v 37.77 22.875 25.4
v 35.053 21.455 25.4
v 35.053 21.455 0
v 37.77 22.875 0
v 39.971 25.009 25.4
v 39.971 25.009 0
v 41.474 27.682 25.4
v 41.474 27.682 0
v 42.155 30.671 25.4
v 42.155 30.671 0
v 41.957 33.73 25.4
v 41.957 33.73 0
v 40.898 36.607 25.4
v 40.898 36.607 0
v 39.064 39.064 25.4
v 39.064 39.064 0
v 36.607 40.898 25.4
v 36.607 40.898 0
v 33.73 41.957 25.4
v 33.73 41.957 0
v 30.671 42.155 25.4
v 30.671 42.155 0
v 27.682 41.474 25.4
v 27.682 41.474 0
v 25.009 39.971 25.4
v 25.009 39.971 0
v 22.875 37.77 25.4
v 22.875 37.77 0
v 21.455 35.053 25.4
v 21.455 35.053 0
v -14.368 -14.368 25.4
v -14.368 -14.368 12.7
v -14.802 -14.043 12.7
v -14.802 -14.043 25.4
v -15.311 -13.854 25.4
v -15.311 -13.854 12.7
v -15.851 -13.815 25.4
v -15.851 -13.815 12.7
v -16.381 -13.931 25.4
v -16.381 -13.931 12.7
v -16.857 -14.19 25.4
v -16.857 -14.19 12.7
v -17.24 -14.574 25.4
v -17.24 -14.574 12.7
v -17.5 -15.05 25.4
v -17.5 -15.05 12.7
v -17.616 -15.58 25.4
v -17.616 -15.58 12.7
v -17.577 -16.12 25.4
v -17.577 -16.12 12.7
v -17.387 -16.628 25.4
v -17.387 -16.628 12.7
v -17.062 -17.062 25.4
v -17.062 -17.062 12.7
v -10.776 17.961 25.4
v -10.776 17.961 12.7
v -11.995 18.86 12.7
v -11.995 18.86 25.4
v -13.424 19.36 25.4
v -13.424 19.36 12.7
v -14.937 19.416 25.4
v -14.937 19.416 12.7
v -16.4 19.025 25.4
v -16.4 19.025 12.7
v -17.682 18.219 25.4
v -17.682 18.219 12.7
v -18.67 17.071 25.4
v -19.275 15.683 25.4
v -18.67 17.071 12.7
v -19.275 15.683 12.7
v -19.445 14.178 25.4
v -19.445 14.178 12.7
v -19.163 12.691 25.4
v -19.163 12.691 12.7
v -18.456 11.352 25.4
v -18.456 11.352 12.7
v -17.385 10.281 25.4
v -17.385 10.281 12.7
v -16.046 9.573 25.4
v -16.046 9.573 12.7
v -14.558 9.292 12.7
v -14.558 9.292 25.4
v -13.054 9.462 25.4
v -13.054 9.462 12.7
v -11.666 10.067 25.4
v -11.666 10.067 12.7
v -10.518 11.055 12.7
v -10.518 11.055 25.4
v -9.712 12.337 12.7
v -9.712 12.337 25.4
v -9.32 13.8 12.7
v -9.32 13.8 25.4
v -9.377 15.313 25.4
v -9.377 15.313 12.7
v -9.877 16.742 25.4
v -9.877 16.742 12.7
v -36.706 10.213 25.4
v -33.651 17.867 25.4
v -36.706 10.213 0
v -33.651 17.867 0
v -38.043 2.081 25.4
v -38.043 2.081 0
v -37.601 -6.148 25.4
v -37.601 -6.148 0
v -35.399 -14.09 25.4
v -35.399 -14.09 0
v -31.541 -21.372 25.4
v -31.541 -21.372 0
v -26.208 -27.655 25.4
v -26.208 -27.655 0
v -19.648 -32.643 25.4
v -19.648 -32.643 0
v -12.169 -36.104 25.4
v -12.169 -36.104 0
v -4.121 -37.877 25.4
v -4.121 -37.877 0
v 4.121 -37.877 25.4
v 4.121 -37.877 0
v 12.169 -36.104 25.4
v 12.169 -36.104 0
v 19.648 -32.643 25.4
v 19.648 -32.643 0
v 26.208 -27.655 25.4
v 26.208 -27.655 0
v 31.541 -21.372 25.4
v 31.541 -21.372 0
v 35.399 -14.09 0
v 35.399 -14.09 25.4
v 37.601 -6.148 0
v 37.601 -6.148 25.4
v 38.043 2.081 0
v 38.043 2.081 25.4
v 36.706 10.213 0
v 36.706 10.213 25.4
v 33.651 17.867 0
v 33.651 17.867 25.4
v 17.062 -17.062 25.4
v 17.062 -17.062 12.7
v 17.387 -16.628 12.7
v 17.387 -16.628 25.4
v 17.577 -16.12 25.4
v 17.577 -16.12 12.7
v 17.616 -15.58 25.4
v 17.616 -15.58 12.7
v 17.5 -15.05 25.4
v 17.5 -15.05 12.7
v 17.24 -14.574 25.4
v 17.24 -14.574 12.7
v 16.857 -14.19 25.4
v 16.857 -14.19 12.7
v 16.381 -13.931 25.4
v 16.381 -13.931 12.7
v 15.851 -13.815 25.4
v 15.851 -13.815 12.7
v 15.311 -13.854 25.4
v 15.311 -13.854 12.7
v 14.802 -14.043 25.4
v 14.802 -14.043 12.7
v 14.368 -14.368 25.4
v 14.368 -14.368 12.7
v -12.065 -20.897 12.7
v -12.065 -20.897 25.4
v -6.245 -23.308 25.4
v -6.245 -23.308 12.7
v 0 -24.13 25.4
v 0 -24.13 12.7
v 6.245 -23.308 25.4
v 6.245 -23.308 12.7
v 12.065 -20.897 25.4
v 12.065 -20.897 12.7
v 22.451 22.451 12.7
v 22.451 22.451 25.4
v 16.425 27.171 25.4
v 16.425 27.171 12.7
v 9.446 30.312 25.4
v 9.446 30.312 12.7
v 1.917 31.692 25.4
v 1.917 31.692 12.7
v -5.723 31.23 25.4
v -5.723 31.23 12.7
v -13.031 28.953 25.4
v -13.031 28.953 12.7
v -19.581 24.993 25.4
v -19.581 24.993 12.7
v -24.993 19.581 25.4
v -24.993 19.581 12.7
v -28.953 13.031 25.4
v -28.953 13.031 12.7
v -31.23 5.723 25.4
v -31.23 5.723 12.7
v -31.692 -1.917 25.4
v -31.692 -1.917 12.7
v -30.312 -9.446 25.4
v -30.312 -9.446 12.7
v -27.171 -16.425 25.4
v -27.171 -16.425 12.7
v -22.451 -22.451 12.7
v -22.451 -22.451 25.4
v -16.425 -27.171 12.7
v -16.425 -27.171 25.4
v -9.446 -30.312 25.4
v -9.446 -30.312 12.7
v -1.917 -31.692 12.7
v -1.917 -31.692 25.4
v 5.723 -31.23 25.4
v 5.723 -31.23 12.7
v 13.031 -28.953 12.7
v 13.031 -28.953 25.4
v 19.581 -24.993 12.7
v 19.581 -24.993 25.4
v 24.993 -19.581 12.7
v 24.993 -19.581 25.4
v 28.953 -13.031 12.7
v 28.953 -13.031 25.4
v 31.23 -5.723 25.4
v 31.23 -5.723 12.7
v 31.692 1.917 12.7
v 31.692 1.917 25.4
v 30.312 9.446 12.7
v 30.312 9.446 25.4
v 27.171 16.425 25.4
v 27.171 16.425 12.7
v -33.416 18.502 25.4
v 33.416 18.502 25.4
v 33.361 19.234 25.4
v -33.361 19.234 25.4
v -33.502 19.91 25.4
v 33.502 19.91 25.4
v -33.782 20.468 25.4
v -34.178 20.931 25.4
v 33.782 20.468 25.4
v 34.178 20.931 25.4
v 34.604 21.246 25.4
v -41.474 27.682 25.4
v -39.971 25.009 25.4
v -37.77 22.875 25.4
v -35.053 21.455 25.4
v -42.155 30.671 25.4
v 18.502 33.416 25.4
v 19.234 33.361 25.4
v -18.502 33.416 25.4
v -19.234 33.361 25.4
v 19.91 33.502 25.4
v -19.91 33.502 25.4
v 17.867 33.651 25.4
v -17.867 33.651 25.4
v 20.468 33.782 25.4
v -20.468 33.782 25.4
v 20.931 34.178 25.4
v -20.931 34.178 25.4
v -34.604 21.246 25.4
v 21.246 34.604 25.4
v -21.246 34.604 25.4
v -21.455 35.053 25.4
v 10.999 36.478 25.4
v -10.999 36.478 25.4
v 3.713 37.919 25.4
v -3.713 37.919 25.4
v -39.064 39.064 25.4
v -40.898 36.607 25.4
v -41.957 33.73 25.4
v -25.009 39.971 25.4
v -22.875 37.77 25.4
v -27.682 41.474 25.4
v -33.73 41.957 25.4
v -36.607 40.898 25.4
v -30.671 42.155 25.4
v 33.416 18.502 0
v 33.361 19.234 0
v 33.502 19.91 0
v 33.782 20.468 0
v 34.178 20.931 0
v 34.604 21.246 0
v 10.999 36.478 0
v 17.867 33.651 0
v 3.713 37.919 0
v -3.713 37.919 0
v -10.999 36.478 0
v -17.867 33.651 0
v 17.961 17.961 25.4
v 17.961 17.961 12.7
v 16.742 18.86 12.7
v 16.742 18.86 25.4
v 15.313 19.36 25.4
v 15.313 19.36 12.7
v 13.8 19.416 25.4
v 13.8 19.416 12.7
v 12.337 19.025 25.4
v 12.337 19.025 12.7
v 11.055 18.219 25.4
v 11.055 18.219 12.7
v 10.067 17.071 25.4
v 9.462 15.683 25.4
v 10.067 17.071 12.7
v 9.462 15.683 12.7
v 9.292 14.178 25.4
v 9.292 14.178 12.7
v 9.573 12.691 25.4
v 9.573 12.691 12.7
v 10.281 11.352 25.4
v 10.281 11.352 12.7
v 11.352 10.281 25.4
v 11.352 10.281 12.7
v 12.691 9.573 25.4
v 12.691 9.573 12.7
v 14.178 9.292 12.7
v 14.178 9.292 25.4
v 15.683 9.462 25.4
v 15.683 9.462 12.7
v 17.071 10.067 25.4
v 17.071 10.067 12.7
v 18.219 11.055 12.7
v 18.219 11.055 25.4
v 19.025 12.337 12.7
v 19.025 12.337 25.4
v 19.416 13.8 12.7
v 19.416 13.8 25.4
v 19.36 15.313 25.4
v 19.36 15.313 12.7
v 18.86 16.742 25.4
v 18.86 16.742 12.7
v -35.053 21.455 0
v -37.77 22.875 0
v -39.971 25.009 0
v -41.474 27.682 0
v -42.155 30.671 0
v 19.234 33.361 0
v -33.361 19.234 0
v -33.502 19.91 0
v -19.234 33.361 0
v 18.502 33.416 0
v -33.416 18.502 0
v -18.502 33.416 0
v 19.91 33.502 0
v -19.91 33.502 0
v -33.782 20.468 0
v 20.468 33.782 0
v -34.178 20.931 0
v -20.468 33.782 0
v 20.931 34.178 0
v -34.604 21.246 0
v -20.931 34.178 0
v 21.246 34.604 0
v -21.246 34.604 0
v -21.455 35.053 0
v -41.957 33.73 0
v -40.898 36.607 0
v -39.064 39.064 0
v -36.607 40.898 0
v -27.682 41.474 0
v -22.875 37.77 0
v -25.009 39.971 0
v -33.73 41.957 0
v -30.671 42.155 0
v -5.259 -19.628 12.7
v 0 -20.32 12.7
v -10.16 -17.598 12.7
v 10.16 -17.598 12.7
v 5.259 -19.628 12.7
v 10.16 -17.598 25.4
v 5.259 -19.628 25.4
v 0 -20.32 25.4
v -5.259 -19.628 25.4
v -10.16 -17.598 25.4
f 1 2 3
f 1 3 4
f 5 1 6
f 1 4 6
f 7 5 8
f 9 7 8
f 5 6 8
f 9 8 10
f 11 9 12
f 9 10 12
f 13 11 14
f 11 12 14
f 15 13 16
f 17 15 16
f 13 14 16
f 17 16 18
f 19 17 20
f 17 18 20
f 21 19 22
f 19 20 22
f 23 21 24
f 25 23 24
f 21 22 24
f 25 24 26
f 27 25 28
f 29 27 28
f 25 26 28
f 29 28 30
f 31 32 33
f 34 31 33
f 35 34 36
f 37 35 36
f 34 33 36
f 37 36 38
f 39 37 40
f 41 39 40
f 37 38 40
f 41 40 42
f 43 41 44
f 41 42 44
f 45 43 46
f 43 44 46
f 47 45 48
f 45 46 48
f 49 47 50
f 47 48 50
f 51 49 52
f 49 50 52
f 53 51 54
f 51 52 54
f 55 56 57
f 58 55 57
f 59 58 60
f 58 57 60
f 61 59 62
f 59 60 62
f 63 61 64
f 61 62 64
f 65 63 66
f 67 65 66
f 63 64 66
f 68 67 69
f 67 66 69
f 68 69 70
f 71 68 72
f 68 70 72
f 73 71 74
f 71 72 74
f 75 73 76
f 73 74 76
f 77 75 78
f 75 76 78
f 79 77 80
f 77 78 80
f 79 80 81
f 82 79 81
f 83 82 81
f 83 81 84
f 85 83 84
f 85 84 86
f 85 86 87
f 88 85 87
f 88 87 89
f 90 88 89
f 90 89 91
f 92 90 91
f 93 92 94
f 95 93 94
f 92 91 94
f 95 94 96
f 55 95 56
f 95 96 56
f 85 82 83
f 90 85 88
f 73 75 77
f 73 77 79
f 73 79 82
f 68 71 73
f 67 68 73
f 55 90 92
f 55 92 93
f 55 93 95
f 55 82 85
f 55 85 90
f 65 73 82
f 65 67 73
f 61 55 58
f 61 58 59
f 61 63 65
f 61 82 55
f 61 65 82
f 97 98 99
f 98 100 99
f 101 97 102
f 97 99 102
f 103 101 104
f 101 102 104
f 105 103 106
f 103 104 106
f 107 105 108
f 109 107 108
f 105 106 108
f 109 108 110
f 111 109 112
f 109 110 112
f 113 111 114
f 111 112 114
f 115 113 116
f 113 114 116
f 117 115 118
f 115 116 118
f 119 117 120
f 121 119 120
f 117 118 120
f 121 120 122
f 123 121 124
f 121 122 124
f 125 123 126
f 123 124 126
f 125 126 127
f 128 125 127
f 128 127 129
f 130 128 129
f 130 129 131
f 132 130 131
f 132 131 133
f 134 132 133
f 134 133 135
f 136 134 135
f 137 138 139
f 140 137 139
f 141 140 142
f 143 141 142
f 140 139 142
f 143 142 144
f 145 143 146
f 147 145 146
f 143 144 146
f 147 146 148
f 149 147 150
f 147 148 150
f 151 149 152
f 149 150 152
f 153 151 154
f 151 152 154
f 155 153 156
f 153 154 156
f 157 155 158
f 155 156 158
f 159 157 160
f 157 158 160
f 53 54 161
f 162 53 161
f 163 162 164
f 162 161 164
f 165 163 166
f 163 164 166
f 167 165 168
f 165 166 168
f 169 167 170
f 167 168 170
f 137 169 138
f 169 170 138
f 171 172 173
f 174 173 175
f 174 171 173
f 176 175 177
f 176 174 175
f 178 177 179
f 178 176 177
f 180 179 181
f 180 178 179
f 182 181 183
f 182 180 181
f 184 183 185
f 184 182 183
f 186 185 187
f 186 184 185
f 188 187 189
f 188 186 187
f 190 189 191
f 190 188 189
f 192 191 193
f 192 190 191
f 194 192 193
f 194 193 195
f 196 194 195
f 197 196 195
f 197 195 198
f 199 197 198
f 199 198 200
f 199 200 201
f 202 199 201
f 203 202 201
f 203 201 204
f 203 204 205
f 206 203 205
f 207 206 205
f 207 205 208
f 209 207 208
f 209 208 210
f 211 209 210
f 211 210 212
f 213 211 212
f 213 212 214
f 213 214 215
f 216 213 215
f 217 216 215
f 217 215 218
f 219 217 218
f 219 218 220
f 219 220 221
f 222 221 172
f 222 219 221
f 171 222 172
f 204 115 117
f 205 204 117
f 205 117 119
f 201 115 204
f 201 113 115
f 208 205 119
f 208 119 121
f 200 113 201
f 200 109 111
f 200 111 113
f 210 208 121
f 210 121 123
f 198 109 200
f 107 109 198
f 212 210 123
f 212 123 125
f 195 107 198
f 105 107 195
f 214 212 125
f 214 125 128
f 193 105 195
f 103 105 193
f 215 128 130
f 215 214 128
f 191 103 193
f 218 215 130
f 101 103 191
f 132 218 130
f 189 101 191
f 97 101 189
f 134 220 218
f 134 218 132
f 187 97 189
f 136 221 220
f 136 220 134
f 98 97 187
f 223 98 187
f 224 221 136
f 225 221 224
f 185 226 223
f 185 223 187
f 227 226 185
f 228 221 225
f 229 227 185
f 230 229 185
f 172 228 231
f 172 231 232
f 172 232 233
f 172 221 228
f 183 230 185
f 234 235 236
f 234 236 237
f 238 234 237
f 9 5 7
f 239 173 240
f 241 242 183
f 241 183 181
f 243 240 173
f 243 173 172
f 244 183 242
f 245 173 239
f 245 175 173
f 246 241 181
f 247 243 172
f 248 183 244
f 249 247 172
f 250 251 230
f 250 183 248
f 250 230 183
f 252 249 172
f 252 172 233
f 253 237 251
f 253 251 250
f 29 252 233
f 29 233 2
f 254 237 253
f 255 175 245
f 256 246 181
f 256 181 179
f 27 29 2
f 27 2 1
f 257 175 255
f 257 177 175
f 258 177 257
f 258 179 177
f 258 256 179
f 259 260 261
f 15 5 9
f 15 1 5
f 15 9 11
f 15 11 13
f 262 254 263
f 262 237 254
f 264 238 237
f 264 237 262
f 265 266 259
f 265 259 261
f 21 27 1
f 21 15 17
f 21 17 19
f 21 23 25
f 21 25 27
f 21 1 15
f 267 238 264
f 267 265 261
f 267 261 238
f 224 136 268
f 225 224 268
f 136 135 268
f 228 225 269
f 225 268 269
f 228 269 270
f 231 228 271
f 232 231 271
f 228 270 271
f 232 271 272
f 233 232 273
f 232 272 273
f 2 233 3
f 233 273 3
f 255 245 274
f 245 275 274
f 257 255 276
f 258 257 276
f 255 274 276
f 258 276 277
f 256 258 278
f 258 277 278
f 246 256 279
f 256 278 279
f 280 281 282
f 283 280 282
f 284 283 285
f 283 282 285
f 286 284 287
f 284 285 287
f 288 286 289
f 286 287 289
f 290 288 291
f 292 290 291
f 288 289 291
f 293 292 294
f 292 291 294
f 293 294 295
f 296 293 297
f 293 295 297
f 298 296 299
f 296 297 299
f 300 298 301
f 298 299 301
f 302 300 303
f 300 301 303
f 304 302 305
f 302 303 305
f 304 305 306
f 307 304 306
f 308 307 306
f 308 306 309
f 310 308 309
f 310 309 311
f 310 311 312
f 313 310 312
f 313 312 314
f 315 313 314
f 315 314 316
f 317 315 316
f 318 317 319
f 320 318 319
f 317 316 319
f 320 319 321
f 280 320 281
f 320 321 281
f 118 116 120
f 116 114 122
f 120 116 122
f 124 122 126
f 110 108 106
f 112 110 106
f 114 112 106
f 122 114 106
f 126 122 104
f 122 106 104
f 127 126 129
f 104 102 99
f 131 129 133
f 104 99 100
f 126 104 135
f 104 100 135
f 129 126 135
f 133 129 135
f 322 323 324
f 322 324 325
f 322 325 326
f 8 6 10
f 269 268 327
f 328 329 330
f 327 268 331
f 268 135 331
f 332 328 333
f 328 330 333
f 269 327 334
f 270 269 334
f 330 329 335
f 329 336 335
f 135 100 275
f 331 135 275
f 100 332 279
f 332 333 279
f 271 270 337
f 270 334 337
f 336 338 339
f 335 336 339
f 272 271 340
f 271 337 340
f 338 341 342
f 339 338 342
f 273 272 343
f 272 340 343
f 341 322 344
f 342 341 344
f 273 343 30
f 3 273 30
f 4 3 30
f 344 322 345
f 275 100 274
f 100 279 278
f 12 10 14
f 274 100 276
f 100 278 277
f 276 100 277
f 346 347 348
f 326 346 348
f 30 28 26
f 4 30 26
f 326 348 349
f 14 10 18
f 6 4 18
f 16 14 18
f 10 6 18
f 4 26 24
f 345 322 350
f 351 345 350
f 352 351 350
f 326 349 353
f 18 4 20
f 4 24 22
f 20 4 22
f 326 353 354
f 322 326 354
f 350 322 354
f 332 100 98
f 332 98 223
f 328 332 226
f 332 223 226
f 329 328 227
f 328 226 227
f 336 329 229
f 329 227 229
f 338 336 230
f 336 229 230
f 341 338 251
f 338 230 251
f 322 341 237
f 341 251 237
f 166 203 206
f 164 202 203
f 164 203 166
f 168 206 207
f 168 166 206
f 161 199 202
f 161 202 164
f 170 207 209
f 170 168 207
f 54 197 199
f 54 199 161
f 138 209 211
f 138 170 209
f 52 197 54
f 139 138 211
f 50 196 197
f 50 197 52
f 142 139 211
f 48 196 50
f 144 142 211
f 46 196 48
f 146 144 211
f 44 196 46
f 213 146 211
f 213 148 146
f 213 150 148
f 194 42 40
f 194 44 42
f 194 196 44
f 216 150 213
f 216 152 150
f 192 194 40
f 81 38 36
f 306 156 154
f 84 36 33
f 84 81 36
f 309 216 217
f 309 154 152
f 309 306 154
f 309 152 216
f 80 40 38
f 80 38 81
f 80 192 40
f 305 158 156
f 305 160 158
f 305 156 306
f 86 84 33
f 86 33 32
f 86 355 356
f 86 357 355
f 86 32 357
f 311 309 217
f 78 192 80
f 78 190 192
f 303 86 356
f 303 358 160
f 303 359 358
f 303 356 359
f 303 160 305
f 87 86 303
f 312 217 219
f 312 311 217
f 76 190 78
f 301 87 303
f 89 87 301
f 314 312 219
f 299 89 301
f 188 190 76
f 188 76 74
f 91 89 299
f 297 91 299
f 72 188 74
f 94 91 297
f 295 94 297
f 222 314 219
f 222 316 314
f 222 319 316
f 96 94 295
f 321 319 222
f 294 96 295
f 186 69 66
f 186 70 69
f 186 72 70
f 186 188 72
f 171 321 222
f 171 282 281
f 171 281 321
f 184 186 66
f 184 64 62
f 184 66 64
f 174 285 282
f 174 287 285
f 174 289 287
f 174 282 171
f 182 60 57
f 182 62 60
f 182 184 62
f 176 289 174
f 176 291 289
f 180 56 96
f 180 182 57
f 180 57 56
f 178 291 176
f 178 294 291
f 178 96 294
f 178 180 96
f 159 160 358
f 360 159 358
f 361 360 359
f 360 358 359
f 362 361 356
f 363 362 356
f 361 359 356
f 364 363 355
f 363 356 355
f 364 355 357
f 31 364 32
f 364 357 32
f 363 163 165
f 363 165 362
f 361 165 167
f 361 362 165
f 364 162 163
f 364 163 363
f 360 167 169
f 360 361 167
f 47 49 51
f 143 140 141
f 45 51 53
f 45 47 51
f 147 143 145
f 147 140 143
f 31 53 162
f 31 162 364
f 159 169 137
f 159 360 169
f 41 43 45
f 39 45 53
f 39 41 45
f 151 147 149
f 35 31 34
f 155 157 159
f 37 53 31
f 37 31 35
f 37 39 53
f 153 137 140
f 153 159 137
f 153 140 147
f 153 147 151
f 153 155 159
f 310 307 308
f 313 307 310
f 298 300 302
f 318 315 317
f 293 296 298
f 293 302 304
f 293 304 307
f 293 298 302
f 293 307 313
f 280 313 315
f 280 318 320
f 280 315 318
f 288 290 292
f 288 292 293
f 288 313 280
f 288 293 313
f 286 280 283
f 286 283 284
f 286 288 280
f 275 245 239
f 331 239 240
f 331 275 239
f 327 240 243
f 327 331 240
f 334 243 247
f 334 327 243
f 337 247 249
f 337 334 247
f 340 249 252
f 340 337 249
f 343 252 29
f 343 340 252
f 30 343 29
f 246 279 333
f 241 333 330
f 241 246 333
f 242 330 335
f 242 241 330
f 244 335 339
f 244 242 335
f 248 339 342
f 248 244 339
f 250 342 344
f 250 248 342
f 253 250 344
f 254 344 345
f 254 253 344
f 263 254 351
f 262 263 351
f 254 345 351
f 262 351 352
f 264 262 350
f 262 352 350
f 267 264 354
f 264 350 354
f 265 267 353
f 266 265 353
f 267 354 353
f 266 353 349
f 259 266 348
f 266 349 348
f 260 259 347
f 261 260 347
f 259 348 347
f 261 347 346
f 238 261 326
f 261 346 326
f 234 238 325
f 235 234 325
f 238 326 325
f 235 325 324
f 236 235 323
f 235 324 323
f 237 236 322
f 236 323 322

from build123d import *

# Parameters (mm, degrees)
F0_R     = 31.75
F2_DEPTH = 12.7
F3_R     = 5.08
F4_DEPTH = 12.7
F5_DEPTH = 25.4
F6_ANGLE = 45
F7_R     = 2.54


with BuildPart() as f2:
    # F0 (on Top) → F2 (new body)
    with BuildSketch(Plane.XY):
        with BuildLine():
            ThreePointArc((37.2940384615, -7.7951712765), (37.8979739919, -3.9183628351), (38.1, 0))
            ThreePointArc((38.1, 0), (37.8979739919, 3.9183628351), (37.2940384615, 7.7951712765))
            ThreePointArc((37.2940384615, 7.7951712765), (26.9407683632, 26.9407683632), (7.7951712765, 37.2940384615))
            ThreePointArc((7.7951712765, 37.2940384615), (0, 38.1), (-7.7951712765, 37.2940384615))
            ThreePointArc((-7.7951712765, 37.2940384615), (-26.9407683632, -26.9407683632), (37.2940384615, -7.7951712765))
        make_face()
        Circle(F0_R, mode=Mode.SUBTRACT)
        with BuildLine():
            ThreePointArc((37.2940384615, 7.7951712765), (37.8979739919, 3.9183628351), (38.1, 0))
            ThreePointArc((38.1, 0), (37.8979739919, -3.9183628351), (37.2940384615, -7.7951712765))
            ThreePointArc((37.2940384615, -7.7951712765), (55.245, 0), (37.2940384615, 7.7951712765))
        make_face()
        with BuildLine():
            ThreePointArc((-7.7951712765, 37.2940384615), (0, 38.1), (7.7951712765, 37.2940384615))
            ThreePointArc((7.7951712765, 37.2940384615), (0, 55.245), (-7.7951712765, 37.2940384615))
        make_face()
        Circle(F0_R)
    extrude(amount=F2_DEPTH)

    # F3 (on face) → F4 (join)
    with BuildSketch(Plane.XY.offset(12.7)):
        with Locations((0, 20.32)):
            Circle(F3_R)
        with Locations((20.32, 0)):
            Circle(F3_R)
        with BuildLine():
            ThreePointArc((0, -24.13), (1.905, -22.225), (0, -20.32))
            ThreePointArc((0, -20.32), (-14.3684097937, -14.3684097937), (-20.32, 0))
            ThreePointArc((-20.32, 0), (-22.225, 1.905), (-24.13, 0))
            ThreePointArc((-24.13, 0), (-17.06248663, -17.06248663), (0, -24.13))
        make_face()
    extrude(amount=F4_DEPTH)

    # F0 (on Top) → F5 (join)
    with BuildSketch(Plane.XY):
        with BuildLine():
            ThreePointArc((37.2940384615, -7.7951712765), (37.8979739919, -3.9183628351), (38.1, 0))
            ThreePointArc((38.1, 0), (37.8979739919, 3.9183628351), (37.2940384615, 7.7951712765))
            ThreePointArc((37.2940384615, 7.7951712765), (26.9407683632, 26.9407683632), (7.7951712765, 37.2940384615))
            ThreePointArc((7.7951712765, 37.2940384615), (0, 38.1), (-7.7951712765, 37.2940384615))
            ThreePointArc((-7.7951712765, 37.2940384615), (-26.9407683632, -26.9407683632), (37.2940384615, -7.7951712765))
        make_face()
        Circle(F0_R, mode=Mode.SUBTRACT)
        with BuildLine():
            ThreePointArc((-7.7951712765, 37.2940384615), (0, 38.1), (7.7951712765, 37.2940384615))
            ThreePointArc((7.7951712765, 37.2940384615), (0, 55.245), (-7.7951712765, 37.2940384615))
        make_face()
        with BuildLine():
            ThreePointArc((37.2940384615, 7.7951712765), (37.8979739919, 3.9183628351), (38.1, 0))
            ThreePointArc((38.1, 0), (37.8979739919, -3.9183628351), (37.2940384615, -7.7951712765))
            ThreePointArc((37.2940384615, -7.7951712765), (55.245, 0), (37.2940384615, 7.7951712765))
        make_face()
    extrude(amount=F5_DEPTH)


with BuildPart() as f2_1:
    # F6: moved
    add(f2.part.rotate(Axis((0, 0, 29.6926), (0, 0, 1)), F6_ANGLE))

    # F7
    f7_edges = [f2_1.edges().sort_by_distance(p)[0] for p in [
        (-20.858849, 31.882886, 12.7),
        (-31.882886, 20.858849, 12.7),
        (31.882886, 20.858849, 12.7),
        (20.858849, 31.882886, 12.7),
    ]]
    fillet(f7_edges, radius=F7_R)


solid = f2_1.part
